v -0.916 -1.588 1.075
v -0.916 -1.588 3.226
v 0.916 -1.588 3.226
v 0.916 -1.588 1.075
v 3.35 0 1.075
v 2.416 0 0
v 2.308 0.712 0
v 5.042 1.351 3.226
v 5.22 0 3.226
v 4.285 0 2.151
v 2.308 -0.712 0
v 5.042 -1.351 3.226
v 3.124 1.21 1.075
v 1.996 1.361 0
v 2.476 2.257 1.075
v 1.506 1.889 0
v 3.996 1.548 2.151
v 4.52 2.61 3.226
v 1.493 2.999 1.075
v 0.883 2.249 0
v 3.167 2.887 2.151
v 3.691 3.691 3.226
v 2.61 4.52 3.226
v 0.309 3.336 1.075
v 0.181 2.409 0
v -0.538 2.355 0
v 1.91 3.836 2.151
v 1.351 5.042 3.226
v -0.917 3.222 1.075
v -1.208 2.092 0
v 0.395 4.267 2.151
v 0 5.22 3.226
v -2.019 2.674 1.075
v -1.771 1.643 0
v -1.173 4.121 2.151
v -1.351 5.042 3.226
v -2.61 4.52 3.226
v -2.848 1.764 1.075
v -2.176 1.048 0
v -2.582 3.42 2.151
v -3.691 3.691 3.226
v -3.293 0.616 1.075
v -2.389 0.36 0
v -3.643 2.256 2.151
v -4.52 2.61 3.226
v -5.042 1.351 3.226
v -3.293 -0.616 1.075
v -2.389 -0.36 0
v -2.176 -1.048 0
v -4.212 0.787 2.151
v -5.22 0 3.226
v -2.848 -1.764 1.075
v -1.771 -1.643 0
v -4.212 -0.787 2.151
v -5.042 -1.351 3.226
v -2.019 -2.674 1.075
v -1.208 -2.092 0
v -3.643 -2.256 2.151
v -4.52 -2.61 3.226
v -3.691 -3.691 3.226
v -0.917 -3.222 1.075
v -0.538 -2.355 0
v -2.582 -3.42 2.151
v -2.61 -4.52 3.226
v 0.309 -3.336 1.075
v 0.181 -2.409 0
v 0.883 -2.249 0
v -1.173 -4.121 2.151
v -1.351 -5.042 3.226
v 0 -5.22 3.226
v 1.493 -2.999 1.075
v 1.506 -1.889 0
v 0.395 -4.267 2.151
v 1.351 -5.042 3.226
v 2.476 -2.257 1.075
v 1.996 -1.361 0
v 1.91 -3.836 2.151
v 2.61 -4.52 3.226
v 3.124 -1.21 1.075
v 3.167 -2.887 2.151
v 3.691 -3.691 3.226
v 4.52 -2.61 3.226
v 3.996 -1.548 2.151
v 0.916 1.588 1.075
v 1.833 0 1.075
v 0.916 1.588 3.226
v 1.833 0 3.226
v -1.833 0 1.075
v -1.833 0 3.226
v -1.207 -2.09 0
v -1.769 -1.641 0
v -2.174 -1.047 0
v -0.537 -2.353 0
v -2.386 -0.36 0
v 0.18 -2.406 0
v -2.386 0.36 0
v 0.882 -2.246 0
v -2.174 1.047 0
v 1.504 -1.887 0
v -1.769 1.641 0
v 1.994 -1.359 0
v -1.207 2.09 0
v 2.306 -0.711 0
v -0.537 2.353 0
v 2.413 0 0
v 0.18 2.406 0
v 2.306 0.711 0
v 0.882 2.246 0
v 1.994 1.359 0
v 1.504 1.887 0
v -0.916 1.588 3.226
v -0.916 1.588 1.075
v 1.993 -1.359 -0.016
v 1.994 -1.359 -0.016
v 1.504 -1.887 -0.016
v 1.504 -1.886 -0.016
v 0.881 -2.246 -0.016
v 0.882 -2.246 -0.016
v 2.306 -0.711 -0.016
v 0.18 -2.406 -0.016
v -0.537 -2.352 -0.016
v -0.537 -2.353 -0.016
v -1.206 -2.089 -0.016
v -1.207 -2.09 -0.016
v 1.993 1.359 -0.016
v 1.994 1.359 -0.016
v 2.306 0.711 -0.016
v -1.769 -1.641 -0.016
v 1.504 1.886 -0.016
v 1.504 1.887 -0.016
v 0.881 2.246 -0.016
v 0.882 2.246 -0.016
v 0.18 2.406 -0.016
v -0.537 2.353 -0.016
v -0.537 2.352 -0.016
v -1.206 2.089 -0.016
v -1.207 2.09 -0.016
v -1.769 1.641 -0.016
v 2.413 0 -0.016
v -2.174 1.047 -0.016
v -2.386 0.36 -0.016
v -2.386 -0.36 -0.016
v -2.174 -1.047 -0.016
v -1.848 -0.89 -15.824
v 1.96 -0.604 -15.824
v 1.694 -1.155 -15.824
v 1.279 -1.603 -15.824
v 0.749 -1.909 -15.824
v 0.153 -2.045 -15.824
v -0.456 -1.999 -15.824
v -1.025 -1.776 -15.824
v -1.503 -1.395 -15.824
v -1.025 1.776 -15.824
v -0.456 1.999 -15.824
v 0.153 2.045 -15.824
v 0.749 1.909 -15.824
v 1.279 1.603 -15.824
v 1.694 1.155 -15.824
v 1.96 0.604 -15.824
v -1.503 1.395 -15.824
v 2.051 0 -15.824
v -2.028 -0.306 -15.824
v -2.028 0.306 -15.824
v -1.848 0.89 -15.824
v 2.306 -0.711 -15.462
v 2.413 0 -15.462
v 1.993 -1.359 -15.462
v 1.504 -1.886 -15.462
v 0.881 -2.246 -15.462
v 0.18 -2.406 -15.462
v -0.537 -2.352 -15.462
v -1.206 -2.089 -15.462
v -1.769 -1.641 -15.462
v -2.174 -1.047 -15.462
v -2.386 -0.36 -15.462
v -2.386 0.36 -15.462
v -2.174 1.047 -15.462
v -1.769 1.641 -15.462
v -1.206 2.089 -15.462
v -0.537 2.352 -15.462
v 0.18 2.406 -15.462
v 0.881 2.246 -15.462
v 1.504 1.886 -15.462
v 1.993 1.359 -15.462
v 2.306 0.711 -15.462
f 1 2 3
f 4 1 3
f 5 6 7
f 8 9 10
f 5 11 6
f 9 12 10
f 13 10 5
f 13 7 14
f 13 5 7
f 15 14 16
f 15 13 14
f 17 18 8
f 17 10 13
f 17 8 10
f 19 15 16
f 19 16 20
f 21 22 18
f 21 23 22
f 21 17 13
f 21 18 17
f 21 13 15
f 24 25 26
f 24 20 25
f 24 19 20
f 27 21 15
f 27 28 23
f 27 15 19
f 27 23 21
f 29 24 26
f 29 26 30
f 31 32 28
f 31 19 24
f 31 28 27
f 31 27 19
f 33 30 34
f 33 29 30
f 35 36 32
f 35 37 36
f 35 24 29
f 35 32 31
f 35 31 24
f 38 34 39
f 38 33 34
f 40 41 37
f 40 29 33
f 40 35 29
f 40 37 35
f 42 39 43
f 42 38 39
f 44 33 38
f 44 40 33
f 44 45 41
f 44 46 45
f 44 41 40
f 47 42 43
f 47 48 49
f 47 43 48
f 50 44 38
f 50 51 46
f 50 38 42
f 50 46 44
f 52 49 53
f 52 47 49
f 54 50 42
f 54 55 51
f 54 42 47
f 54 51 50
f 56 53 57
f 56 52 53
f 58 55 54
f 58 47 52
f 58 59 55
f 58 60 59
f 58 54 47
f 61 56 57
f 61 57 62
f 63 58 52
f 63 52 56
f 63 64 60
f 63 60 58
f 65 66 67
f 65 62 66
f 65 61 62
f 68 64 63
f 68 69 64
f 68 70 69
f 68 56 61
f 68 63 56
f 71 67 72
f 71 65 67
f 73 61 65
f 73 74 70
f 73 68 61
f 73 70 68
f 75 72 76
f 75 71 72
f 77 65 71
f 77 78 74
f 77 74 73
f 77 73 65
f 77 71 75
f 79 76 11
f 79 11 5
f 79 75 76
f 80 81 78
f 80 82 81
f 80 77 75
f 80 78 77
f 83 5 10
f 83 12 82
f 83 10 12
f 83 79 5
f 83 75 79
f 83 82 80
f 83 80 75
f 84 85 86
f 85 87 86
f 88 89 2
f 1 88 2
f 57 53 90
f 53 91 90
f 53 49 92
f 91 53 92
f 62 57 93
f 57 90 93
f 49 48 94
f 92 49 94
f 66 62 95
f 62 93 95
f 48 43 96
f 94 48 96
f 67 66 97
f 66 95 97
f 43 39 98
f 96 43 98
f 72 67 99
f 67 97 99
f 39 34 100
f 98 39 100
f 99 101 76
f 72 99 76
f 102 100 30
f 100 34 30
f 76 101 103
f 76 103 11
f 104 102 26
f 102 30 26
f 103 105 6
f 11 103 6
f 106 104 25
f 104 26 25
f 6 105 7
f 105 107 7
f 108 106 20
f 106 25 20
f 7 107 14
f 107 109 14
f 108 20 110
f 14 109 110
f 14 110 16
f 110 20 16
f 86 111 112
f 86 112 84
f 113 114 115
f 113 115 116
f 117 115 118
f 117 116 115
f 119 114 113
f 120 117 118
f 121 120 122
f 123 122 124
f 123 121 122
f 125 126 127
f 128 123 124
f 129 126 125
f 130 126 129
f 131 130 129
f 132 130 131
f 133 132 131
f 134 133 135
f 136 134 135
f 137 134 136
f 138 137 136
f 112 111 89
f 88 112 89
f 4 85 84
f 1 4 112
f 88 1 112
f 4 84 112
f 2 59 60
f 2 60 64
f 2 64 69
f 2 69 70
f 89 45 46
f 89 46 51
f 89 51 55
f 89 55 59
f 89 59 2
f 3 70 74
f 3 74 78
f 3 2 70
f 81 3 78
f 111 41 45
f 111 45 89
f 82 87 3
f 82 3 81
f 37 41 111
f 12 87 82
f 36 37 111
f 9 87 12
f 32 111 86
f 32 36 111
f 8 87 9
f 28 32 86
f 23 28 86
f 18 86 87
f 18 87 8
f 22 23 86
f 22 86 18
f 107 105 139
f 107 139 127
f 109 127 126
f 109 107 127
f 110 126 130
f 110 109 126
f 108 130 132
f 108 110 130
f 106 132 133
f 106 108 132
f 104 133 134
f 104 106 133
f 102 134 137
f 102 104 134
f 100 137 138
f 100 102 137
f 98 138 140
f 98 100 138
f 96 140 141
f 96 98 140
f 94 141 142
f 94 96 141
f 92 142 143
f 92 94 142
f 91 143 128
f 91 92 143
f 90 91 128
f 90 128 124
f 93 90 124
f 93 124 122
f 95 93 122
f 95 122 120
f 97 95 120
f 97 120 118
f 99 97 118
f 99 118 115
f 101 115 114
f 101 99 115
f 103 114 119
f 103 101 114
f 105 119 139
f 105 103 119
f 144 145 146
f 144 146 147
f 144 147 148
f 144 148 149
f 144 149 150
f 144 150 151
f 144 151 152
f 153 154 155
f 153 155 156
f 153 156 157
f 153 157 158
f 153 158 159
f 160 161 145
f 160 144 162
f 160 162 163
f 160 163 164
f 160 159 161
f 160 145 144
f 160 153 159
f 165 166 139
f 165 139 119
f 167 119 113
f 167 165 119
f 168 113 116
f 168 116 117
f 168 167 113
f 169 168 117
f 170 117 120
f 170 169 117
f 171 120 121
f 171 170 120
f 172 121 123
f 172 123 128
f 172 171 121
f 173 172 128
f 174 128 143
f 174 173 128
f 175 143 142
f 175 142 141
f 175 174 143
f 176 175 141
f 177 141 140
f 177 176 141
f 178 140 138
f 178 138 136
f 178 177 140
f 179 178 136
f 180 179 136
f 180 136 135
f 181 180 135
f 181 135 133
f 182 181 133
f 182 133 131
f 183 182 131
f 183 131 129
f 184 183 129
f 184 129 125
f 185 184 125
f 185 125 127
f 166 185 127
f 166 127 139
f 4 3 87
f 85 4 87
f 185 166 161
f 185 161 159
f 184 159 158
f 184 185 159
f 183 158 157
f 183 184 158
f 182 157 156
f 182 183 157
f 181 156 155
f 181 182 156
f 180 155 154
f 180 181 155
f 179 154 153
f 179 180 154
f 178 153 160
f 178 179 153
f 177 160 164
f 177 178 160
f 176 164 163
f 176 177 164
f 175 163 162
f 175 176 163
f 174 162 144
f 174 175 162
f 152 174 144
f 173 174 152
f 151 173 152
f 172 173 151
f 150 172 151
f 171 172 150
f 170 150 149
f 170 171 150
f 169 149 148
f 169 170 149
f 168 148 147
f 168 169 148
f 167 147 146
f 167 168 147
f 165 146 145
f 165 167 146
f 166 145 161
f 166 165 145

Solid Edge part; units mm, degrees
sketch "Sketch1" plane through (0, 0, 0) normal (0, 0, 1) x (1, 0, 0)
  circle A0 centre (0, 0) radius 5.2197
  dimension "D1" = 10.4394
extrude "Protrusion1" add sketch "Sketch1" along normal blind 3.2258
sketch "Sketch2" plane through (0, 0, 0) normal (0, 0, -1) x (1, 0, 0)
  circle A0 centre (0, 0) radius 2.413
extrude "Protrusion2" add sketch "Sketch2" along normal blind 15.8242
sketch "Sketch3" plane through (0, 0, -15.8242) normal (0, 0, -1) x (1, 0, 0)
  circle A0 centre (0, 0) radius 2.4127
extrude "Cutout1" cut sketch "Sketch3" against normal blind 15.8084 flip side to cut
chamfer "Chamfer_1" distance 0.3619 angle 45 1 edges at (-2.4127, 0, -15.8242)
sketch "Sketch4" plane through (0, 0, 3.2258) normal (0, 0, 1) x (1, 0, 0)
  line L0 (-0.9165, 1.5875) -> (0.9165, 1.5875)
  line L1 (1.8331, 0) -> (0.9165, 1.5875)
  line L2 (0.9165, -1.5875) -> (1.8331, 0)
  line L3 (-0.9165, -1.5875) -> (0.9165, -1.5875)
  line L4 (-1.8331, 0) -> (-0.9165, -1.5875)
  line L5 (-0.9165, 1.5875) -> (-1.8331, 0)
  dimension "D1" = 3.175
extrude "Cutout2" cut sketch "Sketch4" against normal blind 2.1505
sketch "Sketch5" plane through (0, 0, 0) normal (0, -1, 0) x (1, 0, 0)
  line L0 (5.2197, 3.2258) -> (2.4156, 0)
  line L1 (2.4156, 0) -> (5.2197, 0)
  line L2 (5.2197, 0) -> (5.2197, 3.2258)
revolve "RevolvedCutout1" cut sketch "Sketch5" angle 360 about axis through (0, 0, 14.0017) along (0, 0, -1)
properties part number "24101615"
